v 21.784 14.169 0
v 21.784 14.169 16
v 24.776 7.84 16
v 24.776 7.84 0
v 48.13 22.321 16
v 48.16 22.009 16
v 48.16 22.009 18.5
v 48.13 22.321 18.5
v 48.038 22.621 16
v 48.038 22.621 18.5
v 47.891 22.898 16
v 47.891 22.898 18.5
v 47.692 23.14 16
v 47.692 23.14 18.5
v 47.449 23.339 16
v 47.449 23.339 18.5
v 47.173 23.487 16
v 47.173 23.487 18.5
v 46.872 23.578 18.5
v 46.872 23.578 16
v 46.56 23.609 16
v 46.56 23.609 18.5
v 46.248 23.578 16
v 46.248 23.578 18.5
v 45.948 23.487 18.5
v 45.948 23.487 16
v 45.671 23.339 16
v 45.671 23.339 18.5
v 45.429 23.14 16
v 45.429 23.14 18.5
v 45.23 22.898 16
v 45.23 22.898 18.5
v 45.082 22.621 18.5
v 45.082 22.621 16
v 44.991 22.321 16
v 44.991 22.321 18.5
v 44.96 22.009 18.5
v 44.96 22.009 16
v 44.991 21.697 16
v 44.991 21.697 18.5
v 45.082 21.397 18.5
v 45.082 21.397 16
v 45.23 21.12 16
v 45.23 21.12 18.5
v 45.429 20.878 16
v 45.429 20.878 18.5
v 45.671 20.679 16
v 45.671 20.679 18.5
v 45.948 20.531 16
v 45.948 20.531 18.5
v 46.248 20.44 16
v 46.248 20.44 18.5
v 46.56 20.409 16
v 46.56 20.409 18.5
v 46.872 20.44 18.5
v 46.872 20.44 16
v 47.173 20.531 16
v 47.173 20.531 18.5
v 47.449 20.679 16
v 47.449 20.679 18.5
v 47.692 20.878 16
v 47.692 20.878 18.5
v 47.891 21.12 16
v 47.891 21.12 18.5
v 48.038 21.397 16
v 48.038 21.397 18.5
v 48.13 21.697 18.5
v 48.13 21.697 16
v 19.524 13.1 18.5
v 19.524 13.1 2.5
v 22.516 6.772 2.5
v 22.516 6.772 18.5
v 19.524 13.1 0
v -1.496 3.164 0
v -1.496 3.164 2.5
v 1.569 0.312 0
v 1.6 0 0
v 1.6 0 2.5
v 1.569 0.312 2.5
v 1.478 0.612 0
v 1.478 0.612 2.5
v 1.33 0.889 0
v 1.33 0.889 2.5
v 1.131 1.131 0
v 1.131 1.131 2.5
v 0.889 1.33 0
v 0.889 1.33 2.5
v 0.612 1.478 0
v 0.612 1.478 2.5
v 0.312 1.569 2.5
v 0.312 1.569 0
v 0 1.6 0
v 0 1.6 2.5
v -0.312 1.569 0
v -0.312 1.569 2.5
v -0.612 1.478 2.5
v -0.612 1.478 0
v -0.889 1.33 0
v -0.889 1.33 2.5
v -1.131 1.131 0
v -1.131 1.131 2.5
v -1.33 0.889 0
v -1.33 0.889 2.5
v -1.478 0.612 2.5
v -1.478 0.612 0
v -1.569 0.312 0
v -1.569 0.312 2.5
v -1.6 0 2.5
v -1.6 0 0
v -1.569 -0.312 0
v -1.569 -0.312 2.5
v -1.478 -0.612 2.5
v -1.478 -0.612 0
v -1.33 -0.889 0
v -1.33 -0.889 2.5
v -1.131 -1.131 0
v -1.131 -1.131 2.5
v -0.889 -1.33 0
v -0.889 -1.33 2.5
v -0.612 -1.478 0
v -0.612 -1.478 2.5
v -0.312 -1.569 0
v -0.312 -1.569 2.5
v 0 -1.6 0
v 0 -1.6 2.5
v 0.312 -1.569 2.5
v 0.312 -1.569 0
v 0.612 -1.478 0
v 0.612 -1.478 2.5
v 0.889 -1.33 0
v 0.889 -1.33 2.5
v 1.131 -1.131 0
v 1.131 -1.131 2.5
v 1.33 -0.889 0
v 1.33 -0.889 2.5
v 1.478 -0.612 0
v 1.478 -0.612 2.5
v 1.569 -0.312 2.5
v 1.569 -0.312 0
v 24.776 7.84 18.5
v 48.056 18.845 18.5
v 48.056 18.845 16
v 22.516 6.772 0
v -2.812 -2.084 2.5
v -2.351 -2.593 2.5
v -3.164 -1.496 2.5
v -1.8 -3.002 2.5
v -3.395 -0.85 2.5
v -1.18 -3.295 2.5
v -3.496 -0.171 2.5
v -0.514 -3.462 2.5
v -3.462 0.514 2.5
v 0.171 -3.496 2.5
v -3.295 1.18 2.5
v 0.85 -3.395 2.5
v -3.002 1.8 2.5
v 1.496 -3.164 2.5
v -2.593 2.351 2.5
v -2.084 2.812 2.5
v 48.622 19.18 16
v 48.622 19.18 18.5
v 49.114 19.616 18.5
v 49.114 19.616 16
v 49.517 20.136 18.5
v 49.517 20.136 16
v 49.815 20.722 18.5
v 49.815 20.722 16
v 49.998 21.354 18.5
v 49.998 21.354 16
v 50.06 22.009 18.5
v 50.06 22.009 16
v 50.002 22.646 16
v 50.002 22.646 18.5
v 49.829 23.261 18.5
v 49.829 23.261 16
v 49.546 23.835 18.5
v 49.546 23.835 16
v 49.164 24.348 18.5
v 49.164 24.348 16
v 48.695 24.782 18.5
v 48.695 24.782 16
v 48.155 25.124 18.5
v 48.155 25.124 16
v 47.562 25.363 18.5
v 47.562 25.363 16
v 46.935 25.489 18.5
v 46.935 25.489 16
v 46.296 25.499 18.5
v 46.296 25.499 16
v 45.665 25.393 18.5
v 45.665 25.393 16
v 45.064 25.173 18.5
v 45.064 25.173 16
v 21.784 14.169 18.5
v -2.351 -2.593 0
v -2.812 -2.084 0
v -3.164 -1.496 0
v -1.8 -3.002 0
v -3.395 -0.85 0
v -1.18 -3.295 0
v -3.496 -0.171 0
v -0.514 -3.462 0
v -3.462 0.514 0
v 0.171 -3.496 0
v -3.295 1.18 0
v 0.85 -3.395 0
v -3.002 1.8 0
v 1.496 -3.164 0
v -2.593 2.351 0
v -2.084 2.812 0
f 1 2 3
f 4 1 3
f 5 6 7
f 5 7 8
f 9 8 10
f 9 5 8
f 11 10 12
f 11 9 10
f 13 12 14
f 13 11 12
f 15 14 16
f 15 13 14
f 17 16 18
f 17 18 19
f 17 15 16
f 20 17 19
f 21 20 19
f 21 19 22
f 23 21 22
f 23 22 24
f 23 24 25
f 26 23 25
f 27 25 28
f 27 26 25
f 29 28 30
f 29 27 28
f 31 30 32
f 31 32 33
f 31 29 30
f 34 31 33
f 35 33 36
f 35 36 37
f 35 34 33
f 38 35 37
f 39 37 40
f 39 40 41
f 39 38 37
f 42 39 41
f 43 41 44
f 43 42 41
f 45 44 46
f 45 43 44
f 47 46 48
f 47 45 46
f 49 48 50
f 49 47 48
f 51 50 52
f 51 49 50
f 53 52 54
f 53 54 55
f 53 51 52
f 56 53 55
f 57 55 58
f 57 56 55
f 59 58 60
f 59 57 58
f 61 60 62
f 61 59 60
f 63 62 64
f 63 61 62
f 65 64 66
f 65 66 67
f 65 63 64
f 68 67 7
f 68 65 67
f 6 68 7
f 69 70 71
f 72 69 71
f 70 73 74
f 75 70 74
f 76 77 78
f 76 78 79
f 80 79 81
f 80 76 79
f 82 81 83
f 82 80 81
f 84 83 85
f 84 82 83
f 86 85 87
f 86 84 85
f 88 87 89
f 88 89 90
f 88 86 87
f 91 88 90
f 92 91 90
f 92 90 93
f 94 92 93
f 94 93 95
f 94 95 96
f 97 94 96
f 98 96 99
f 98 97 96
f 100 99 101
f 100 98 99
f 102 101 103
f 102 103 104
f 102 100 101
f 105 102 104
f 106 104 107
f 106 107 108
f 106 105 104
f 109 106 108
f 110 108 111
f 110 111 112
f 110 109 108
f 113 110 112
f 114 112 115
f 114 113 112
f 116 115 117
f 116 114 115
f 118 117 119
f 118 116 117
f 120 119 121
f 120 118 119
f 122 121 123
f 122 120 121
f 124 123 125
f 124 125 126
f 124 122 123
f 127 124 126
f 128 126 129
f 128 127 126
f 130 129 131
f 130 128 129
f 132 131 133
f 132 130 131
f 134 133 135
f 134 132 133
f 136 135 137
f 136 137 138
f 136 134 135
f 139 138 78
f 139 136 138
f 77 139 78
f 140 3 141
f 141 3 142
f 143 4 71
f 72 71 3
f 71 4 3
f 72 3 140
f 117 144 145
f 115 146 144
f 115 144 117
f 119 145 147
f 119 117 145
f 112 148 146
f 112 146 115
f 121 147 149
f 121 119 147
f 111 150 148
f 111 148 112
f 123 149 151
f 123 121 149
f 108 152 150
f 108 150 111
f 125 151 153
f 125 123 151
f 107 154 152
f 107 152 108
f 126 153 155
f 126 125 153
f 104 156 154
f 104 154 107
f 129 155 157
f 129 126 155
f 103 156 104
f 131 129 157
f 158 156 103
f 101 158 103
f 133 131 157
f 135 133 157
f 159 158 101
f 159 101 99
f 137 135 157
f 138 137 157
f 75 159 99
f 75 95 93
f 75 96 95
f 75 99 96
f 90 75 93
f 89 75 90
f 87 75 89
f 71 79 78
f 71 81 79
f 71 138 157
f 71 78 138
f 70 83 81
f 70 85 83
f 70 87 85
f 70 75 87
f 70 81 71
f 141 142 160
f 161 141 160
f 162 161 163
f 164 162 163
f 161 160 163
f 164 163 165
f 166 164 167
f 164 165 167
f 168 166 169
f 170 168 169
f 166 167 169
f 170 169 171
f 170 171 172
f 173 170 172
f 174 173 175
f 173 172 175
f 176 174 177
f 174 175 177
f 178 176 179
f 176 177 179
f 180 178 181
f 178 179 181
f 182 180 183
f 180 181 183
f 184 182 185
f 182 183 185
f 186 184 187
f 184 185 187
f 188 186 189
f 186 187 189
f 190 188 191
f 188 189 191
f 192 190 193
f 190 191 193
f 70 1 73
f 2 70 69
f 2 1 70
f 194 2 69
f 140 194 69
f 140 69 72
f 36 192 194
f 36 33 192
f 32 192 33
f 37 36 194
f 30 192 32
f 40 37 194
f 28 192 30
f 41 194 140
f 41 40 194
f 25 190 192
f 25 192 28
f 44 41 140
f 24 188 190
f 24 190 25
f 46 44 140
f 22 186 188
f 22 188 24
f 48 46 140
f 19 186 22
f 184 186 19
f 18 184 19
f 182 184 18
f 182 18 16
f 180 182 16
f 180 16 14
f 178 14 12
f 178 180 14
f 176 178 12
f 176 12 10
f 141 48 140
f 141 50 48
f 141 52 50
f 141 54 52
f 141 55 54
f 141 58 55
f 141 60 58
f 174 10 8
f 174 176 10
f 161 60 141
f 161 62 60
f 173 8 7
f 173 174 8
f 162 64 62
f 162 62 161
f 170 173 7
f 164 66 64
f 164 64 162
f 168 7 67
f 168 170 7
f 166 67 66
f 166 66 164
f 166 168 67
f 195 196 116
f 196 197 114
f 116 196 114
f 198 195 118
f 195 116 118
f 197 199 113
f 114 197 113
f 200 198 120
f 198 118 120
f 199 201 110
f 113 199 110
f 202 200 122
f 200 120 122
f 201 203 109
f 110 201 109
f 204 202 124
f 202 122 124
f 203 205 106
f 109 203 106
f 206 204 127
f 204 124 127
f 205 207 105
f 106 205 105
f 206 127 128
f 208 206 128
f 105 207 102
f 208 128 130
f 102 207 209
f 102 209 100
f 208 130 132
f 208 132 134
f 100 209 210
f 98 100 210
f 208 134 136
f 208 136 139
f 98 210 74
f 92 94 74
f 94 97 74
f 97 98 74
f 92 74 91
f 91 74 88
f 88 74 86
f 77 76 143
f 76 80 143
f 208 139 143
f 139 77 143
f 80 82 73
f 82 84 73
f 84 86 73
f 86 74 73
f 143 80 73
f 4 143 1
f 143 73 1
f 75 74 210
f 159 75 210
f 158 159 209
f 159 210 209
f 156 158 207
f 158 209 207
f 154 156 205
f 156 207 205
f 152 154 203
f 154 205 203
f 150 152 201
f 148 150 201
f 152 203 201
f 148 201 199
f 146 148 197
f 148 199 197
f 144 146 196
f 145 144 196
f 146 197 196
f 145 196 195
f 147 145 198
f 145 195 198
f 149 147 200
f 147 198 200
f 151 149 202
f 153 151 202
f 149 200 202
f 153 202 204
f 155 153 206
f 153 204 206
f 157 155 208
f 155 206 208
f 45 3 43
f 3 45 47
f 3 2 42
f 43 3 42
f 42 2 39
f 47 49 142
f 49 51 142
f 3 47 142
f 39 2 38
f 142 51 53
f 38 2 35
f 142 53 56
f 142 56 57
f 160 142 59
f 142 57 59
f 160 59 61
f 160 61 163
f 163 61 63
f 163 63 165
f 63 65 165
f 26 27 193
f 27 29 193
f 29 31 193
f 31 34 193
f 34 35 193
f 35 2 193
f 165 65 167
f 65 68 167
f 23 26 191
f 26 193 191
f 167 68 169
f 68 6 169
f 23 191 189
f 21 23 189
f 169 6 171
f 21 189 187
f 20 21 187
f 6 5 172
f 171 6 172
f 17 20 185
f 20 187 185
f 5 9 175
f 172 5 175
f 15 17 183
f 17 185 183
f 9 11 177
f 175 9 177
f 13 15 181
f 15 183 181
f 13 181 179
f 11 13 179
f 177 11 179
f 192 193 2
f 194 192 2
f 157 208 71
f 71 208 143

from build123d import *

# Parameters (mm, degrees)
F1_R     = 1.6
F2_DEPTH = 2.5
F3_W     = 7
F3_H     = 18.5
F4_DEPTH = 2.5
F5_R     = 1.6
F6_DEPTH = 2.5


with BuildPart() as f2:
    # F1 (on offset) → F2 (new body)
    with BuildSketch(Plane.XY.offset(16)):
        with BuildLine():
            ThreePointArc((48.0560038294, 18.8446410406), (49.5170345112, 20.1361157487), (50.0602513075, 22.0089299644))
            ThreePointArc((50.0602513075, 22.0089299644), (48.4330655233, 24.9657131681), (45.0644987857, 25.1732188883))
            ThreePointArc((45.0644987857, 25.1732188883), (43.3959623837, 20.5131774426), (48.0560038294, 18.8446410406))
        make_face()
        with Locations((46.5602513075, 22.0089299644)):
            Circle(F1_R, mode=Mode.SUBTRACT)
        with BuildLine():
            ThreePointArc((48.0560038294, 18.8446410406), (43.3959623837, 20.5131774426), (45.0644987857, 25.1732188883))
            Line((45.0644987857, 25.1732188883), (21.7843731319, 14.168753906))
            Line((21.7843731319, 14.168753906), (24.7758781756, 7.8401760584))
            Line((24.7758781756, 7.8401760584), (48.0560038294, 18.8446410406))
        make_face()
    extrude(amount=F2_DEPTH)

    # F3 (on face) → F4 (join)
    with BuildSketch(Plane(origin=(23.2801256538, 11.0044649822, 0), x_dir=(0.4273578634, -0.9040825497, 0), z_dir=(-0.9040825497, -0.4273578634, 0))):
        with Locations((0, 9.25)):
            Rectangle(F3_W, F3_H)
    extrude(amount=F4_DEPTH)

    # F5 (on Top) → F6 (join)
    with BuildSketch(Plane.XY):
        with BuildLine():
            ThreePointArc((1.4957525219, -3.1642889238), (2.9567832036, -1.8728142158), (3.5, 0))
            ThreePointArc((3.5, 0), (1.8728142158, 2.9567832036), (-1.4957525219, 3.1642889238))
            ThreePointArc((-1.4957525219, 3.1642889238), (-3.1642889238, -1.4957525219), (1.4957525219, -3.1642889238))
        make_face()
        Circle(F5_R, mode=Mode.SUBTRACT)
        with BuildLine():
            ThreePointArc((-1.4957525219, 3.1642889238), (1.8728142158, 2.9567832036), (3.5, 0))
            ThreePointArc((3.5, 0), (2.9567832036, -1.8728142158), (1.4957525219, -3.1642889238))
            Line((1.4957525219, -3.1642889238), (22.5156718015, 6.7717813999))
            Line((22.5156718015, 6.7717813999), (19.5241667578, 13.1003592476))
            Line((19.5241667578, 13.1003592476), (-1.4957525219, 3.1642889238))
        make_face()
    extrude(amount=F6_DEPTH)


solid = f2.part
